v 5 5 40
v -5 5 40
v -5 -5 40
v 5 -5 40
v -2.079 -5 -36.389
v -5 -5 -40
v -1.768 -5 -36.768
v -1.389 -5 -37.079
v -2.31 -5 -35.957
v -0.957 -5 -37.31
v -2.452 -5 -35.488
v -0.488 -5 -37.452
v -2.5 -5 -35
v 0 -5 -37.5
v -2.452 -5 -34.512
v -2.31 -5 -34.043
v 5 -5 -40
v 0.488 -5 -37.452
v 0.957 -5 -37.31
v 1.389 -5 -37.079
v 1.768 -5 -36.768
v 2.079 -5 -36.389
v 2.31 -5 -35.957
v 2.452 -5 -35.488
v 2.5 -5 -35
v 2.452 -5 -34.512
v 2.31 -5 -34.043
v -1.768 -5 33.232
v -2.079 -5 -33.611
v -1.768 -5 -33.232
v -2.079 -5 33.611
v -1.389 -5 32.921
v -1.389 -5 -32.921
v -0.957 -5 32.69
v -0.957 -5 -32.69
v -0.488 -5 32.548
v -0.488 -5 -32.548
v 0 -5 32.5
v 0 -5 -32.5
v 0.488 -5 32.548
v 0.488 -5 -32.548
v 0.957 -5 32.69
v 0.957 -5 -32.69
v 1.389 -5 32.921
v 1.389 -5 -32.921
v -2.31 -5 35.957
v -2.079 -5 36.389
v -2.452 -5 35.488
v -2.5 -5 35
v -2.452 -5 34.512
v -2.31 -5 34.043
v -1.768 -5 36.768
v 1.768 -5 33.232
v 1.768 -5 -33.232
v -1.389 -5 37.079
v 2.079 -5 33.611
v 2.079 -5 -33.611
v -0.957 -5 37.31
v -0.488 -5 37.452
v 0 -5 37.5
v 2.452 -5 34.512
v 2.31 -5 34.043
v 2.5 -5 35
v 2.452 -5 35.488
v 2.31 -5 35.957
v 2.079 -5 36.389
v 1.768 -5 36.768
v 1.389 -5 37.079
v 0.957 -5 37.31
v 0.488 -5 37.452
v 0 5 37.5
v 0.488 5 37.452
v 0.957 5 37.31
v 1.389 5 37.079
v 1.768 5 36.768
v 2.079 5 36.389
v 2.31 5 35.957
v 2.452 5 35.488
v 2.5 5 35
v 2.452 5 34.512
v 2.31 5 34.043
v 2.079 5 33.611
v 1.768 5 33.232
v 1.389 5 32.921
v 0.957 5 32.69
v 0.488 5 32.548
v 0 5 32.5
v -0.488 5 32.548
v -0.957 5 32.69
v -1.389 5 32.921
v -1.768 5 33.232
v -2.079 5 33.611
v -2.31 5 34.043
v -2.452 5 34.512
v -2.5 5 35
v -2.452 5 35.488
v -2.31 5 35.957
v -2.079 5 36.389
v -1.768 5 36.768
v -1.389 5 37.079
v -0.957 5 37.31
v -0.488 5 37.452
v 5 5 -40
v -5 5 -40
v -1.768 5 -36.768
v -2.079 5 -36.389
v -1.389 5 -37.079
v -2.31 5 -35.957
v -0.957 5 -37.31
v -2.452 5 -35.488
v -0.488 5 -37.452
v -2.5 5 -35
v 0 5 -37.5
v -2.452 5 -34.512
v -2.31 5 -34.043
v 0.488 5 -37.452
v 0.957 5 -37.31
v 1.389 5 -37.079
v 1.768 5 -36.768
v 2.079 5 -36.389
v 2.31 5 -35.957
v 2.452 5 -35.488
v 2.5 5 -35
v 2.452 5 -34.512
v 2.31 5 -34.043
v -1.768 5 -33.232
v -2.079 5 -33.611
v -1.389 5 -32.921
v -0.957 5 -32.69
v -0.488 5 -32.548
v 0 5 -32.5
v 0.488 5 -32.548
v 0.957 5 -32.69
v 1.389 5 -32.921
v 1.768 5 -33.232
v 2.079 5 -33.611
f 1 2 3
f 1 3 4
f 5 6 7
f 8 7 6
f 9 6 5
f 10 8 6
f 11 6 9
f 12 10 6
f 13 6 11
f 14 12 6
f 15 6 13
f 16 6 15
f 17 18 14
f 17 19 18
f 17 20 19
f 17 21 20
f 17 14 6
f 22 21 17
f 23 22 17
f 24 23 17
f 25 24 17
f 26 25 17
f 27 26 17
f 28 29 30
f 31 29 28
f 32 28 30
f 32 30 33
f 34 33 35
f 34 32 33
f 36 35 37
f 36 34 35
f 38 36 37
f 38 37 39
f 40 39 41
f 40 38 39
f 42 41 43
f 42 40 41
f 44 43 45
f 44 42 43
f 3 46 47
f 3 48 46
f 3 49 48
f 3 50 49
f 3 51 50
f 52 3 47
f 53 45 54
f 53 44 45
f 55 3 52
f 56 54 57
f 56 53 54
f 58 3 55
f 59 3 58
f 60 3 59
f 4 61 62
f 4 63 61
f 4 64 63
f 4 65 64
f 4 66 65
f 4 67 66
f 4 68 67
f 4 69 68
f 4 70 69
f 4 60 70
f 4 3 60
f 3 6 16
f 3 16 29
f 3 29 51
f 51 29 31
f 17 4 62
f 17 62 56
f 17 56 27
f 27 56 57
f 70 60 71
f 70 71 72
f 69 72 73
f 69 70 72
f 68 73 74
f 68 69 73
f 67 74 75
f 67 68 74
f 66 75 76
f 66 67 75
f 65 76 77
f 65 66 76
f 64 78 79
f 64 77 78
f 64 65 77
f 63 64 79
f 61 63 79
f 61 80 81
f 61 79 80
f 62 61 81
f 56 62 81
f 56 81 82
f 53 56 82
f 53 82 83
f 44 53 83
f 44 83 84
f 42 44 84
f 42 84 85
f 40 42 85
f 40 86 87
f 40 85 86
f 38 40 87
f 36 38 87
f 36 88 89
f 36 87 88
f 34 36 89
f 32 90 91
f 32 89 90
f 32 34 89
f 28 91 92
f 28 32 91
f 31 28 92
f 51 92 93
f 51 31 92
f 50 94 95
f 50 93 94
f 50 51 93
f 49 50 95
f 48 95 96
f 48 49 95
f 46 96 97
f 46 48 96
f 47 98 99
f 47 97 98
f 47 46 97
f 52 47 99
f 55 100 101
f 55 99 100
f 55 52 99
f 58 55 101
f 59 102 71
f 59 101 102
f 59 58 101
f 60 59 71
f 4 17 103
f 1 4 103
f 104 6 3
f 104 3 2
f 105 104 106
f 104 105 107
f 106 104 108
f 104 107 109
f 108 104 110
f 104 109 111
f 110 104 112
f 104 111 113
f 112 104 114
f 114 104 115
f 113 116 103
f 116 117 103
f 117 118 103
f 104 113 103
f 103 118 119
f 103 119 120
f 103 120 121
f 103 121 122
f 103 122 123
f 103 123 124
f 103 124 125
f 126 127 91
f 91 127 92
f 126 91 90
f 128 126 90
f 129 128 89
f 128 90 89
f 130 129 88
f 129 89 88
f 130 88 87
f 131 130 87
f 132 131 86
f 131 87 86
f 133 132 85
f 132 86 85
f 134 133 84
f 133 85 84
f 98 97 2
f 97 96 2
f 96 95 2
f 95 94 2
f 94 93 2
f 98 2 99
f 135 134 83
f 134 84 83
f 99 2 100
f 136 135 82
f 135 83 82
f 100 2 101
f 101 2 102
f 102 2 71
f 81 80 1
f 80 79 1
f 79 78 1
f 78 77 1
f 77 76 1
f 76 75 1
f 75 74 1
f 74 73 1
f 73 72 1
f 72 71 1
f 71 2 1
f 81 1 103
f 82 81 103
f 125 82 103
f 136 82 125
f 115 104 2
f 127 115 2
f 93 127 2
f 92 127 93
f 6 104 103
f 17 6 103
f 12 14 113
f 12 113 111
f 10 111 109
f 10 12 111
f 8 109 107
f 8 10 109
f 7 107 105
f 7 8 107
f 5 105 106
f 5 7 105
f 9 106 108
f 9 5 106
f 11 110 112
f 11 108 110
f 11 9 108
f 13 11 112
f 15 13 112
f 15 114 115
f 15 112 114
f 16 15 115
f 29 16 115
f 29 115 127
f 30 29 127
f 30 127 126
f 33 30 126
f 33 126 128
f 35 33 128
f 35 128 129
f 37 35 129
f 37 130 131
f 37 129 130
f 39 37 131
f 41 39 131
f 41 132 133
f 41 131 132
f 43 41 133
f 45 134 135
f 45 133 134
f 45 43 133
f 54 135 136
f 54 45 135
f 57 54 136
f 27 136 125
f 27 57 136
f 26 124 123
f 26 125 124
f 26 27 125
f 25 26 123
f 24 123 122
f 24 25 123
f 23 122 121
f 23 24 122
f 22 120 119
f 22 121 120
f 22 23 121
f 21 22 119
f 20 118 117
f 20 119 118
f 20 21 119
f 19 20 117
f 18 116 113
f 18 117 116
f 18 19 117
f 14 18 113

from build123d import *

# Parameters (mm, degrees)
SKETCH1_W               = 10
SKETCH1_H               = 10
BOSS_EXTRUDE1_DEPTH     = 40
CUT_EXTRUDE1_DEPTH      = 41.620192023
CUT_EXTRUDE1_DEPTH_BACK = 41.620192023
SKETCH2_R               = 2.5


with BuildPart() as part:
    # Sketch1 → Boss-Extrude1 (new, symmetric)
    with BuildSketch(Plane.XY):
        Rectangle(SKETCH1_W, SKETCH1_H)
    extrude(amount=BOSS_EXTRUDE1_DEPTH, both=True)

    # Sketch2 → Cut-Extrude1 (cut, two sides: drawn at the far end of the back side and taken through both)
    with BuildSketch(Plane(origin=(0, 0, 0), x_dir=(1, 0, 0), z_dir=(0, 1, 0)).offset(-CUT_EXTRUDE1_DEPTH_BACK)):
        with Locations(Location((0, -35, 0), (0, 0, 270))):
            Circle(SKETCH2_R)
        with Locations(Location((0, 35, 0), (0, 0, 90))):
            Circle(SKETCH2_R)
    extrude(amount=CUT_EXTRUDE1_DEPTH + CUT_EXTRUDE1_DEPTH_BACK, mode=Mode.SUBTRACT)


solid = part.part
